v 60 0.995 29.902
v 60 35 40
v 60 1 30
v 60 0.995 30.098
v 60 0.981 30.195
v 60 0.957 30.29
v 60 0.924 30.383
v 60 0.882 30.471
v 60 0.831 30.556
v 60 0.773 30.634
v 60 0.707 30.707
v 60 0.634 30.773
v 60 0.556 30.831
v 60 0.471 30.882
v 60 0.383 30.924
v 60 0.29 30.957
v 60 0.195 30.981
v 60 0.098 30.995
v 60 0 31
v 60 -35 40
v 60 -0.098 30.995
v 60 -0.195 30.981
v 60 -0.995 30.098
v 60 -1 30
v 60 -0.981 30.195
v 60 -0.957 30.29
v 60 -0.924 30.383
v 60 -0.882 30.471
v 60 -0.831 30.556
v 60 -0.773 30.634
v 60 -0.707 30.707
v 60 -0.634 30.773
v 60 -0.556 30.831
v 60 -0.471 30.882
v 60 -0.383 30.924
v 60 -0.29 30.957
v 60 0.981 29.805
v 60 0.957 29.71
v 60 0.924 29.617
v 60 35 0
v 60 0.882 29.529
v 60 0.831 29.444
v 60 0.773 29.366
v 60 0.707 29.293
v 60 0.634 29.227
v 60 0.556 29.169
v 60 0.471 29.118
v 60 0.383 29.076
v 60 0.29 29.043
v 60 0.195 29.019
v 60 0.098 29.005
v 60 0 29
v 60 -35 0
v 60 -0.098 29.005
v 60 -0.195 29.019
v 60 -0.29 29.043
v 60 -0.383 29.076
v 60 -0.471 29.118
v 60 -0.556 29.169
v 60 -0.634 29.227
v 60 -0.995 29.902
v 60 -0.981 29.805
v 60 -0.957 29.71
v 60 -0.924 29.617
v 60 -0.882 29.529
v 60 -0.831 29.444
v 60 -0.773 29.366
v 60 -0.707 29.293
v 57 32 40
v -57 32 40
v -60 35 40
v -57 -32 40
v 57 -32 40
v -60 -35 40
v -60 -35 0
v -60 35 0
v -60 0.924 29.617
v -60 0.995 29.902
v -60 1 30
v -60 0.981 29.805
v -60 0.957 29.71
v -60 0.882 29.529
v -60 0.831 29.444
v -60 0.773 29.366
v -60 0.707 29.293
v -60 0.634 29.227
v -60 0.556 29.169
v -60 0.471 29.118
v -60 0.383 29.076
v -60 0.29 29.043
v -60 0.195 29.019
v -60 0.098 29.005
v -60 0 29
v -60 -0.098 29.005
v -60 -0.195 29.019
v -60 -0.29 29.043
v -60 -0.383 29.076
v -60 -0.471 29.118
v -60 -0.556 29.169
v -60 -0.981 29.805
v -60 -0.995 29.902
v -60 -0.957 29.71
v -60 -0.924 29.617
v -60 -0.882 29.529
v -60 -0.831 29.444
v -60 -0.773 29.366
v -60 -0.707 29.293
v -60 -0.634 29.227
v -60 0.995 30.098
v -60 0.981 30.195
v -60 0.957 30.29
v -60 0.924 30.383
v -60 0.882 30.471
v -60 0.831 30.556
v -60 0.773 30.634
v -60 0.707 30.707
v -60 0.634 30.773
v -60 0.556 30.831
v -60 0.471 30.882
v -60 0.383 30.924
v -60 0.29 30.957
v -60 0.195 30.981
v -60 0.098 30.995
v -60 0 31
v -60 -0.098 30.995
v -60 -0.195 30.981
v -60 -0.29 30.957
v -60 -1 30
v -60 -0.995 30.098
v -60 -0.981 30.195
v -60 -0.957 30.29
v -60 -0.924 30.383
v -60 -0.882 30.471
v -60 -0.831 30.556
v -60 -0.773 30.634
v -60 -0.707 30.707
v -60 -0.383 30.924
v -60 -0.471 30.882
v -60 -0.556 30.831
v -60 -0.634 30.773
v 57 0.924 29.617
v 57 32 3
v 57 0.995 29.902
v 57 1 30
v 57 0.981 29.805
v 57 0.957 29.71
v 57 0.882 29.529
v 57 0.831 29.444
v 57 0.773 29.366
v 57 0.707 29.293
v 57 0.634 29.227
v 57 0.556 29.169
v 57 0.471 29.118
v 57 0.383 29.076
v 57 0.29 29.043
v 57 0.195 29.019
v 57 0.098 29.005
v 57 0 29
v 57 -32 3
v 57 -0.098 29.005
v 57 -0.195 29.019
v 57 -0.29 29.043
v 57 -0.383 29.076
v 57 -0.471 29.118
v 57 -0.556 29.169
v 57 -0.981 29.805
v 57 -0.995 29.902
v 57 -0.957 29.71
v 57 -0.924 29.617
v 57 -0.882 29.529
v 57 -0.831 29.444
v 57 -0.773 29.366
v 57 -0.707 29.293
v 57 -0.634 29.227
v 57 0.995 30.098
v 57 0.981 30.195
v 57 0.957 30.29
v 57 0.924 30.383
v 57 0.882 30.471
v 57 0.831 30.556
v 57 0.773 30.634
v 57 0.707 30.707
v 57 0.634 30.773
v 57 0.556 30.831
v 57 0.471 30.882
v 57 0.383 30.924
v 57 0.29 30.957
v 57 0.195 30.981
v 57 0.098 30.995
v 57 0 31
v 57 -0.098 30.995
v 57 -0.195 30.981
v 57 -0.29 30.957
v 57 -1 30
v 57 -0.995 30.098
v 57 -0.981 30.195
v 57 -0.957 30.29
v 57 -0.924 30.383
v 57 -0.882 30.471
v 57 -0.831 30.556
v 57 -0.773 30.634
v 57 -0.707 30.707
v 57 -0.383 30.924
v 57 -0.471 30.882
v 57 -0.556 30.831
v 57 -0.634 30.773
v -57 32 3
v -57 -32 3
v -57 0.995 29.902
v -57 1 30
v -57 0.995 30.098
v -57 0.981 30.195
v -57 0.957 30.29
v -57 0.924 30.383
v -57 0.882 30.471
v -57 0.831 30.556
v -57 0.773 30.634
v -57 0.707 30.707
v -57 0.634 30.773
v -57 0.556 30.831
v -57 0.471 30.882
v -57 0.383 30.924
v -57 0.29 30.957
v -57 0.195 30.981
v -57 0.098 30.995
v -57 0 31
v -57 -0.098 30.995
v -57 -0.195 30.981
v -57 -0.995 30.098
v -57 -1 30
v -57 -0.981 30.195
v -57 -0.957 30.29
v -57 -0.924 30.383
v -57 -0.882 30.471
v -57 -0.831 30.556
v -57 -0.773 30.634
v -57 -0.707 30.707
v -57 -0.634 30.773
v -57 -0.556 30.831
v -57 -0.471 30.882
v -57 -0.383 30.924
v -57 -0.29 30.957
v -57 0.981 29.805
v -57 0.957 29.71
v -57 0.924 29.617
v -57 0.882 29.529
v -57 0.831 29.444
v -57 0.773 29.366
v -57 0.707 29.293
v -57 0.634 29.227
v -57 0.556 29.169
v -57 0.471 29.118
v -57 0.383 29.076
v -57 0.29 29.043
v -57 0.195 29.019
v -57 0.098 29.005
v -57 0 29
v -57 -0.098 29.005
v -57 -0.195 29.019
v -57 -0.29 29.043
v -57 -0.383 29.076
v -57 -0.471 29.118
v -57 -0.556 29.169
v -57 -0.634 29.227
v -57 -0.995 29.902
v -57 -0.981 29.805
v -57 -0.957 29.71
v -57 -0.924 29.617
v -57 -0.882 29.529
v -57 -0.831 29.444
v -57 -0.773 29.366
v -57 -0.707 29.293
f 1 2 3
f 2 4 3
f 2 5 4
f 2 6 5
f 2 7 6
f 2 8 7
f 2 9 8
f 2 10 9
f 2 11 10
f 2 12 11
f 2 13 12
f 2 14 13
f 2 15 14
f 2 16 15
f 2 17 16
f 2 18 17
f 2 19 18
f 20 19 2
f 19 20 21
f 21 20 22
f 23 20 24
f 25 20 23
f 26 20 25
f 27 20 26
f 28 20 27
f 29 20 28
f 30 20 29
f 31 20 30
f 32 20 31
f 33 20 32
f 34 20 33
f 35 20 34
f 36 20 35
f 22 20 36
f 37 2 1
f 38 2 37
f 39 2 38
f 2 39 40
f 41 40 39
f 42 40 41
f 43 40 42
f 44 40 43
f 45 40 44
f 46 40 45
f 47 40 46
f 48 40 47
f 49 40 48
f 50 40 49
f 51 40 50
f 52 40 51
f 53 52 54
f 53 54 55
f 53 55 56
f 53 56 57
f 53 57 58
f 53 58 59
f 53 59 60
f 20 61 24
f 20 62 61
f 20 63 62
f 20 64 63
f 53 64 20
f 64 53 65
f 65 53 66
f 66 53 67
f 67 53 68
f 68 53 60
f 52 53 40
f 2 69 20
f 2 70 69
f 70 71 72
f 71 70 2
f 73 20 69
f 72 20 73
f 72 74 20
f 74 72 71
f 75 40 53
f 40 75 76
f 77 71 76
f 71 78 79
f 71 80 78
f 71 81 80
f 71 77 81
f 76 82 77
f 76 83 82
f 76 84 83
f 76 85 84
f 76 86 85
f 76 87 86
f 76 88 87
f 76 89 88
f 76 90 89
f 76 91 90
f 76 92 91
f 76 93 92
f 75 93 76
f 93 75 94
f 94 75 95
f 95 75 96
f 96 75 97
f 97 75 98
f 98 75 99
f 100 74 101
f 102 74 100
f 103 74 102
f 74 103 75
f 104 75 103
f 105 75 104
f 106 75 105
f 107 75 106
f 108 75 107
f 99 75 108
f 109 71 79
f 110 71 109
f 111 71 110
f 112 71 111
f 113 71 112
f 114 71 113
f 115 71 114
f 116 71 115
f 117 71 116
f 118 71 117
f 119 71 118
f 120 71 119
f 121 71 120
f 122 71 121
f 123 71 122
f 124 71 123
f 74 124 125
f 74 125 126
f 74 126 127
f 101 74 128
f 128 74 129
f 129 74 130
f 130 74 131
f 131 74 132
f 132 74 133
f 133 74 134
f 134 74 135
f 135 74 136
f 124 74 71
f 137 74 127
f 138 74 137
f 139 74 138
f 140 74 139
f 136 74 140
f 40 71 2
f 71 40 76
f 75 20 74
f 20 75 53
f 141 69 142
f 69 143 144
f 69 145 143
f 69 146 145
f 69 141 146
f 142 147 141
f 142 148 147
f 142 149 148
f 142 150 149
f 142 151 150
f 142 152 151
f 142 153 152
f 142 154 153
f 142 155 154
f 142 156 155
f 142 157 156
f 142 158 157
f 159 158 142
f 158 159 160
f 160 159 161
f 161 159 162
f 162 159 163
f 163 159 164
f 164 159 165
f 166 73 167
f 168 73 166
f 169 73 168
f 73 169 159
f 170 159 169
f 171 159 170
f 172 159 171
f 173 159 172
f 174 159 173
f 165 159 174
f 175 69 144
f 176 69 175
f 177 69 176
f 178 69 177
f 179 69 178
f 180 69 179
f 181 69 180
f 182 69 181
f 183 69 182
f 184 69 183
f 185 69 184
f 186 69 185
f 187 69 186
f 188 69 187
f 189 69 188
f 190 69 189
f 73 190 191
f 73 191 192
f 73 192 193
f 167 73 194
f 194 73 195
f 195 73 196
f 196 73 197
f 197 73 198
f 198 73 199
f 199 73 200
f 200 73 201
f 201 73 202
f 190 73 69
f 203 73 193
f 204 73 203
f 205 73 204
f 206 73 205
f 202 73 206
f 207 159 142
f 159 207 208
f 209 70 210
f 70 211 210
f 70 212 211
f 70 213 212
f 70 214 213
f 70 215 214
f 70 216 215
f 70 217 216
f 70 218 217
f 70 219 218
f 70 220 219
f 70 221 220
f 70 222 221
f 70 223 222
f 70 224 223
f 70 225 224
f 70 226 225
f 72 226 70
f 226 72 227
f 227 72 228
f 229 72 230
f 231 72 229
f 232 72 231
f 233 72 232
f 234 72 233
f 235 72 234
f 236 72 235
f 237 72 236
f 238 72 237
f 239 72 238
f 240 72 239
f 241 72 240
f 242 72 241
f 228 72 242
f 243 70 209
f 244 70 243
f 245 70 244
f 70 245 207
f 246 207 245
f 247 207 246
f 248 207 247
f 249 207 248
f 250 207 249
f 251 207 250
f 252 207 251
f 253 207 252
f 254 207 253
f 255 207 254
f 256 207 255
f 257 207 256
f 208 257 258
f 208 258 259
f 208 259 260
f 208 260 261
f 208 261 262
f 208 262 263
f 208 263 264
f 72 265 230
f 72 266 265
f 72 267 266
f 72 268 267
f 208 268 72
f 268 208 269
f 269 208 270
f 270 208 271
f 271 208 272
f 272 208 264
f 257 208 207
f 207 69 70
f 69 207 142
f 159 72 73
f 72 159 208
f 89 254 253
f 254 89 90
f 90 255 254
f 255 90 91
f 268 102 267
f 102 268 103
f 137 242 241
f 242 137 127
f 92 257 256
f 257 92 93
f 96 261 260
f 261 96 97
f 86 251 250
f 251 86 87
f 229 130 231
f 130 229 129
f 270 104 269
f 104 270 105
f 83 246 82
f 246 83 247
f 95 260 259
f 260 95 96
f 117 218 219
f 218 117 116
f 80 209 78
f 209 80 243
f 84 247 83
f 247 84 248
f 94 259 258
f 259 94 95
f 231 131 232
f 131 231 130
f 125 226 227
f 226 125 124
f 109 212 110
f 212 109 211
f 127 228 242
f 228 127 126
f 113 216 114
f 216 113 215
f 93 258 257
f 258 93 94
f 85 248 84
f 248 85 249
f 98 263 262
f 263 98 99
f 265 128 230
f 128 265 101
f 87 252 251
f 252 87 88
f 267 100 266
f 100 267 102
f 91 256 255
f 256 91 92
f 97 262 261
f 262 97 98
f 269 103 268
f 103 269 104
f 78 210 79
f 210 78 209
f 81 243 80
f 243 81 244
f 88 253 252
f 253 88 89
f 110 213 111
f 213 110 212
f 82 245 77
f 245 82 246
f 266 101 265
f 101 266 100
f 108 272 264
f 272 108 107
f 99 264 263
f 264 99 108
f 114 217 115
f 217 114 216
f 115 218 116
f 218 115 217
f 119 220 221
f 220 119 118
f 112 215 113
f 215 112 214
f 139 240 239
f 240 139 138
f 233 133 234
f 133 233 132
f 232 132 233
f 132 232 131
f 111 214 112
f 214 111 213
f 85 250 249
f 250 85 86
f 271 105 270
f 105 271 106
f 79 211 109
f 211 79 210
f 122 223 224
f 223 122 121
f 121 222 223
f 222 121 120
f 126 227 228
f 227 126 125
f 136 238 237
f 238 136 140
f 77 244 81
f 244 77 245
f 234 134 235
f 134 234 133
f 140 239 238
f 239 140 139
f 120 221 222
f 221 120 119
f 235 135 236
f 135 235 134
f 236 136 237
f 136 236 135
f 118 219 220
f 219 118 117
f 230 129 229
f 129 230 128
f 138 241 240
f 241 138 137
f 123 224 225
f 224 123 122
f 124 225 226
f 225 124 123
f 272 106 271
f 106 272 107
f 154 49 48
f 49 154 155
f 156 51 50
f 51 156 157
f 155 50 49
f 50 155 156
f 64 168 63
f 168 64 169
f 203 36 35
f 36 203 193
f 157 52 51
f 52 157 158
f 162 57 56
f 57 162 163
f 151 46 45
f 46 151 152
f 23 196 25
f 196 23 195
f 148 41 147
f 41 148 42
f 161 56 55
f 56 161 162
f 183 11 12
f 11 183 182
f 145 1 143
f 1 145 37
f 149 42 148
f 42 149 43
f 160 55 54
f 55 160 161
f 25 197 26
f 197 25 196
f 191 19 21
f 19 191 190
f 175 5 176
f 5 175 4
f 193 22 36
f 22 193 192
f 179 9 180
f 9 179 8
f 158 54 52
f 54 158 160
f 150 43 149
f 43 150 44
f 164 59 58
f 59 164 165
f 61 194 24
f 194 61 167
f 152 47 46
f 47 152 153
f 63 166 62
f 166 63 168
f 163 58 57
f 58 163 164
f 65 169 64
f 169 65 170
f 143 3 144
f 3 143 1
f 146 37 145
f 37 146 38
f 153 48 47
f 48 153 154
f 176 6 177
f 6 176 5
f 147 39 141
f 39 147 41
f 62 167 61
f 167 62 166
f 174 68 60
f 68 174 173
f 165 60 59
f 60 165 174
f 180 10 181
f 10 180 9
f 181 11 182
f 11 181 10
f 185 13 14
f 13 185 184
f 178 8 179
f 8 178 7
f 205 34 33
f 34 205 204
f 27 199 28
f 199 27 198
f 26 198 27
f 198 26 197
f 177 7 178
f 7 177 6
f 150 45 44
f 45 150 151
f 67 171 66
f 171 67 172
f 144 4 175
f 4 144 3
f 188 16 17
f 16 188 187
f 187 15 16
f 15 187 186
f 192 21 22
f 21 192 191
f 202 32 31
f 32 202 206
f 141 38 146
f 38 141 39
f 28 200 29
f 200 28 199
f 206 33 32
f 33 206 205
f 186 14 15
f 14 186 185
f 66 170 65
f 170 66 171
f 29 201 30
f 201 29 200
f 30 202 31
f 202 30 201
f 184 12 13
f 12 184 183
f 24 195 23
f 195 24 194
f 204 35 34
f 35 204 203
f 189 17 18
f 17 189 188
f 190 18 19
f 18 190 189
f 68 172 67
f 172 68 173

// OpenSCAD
// Buffer tank for mini horizontal gel-electrophoresis box
// Dimensions measured with calipers

// Outer dimensions
outer_x = 120;
outer_y = 70;
outer_z = 40;

// Wall and floor thickness
wall_thickness = 3;
floor_thickness = 3;

// Inner dimensions (derived)
inner_x = outer_x - 2 * wall_thickness;
inner_y = outer_y - 2 * wall_thickness;
inner_z = outer_z - floor_thickness;

// Gel tray platform dimensions
platform_x = 60;
platform_y = inner_y; // spans full inner width
platform_z = 10; // height above inner floor
platform_top_z = floor_thickness + platform_z; // absolute z position of top surface

// Electrode wire holes
hole_diameter = 2;
hole_y = 0;
hole_z = 30;

// Rendering quality
$fn = 64;

// Main tank body (outer shell minus inner cavity)
difference() {
    // Outer block
    translate([-outer_x/2, -outer_y/2, 0])
        cube([outer_x, outer_y, outer_z]);
    
    // Inner cavity (open top)
    translate([-inner_x/2, -inner_y/2, floor_thickness])
        cube([inner_x, inner_y, inner_z + 1]); // +1 to ensure cut extends past top
    
    // Gel tray platform
    translate([-platform_x/2, -platform_y/2, floor_thickness])
        cube([platform_x, platform_y, platform_z]);
    
    // Electrode wire holes (left and right end walls)
    // Left end wall hole
    translate([-outer_x/2 + wall_thickness/2, hole_y, hole_z])
        rotate([0, 90, 0])
            cylinder(r = hole_diameter/2, h = wall_thickness + 0.1, center = true);
    
    // Right end wall hole
    translate([outer_x/2 - wall_thickness/2, hole_y, hole_z])
        rotate([0, 90, 0])
            cylinder(r = hole_diameter/2, h = wall_thickness + 0.1, center = true);
}
